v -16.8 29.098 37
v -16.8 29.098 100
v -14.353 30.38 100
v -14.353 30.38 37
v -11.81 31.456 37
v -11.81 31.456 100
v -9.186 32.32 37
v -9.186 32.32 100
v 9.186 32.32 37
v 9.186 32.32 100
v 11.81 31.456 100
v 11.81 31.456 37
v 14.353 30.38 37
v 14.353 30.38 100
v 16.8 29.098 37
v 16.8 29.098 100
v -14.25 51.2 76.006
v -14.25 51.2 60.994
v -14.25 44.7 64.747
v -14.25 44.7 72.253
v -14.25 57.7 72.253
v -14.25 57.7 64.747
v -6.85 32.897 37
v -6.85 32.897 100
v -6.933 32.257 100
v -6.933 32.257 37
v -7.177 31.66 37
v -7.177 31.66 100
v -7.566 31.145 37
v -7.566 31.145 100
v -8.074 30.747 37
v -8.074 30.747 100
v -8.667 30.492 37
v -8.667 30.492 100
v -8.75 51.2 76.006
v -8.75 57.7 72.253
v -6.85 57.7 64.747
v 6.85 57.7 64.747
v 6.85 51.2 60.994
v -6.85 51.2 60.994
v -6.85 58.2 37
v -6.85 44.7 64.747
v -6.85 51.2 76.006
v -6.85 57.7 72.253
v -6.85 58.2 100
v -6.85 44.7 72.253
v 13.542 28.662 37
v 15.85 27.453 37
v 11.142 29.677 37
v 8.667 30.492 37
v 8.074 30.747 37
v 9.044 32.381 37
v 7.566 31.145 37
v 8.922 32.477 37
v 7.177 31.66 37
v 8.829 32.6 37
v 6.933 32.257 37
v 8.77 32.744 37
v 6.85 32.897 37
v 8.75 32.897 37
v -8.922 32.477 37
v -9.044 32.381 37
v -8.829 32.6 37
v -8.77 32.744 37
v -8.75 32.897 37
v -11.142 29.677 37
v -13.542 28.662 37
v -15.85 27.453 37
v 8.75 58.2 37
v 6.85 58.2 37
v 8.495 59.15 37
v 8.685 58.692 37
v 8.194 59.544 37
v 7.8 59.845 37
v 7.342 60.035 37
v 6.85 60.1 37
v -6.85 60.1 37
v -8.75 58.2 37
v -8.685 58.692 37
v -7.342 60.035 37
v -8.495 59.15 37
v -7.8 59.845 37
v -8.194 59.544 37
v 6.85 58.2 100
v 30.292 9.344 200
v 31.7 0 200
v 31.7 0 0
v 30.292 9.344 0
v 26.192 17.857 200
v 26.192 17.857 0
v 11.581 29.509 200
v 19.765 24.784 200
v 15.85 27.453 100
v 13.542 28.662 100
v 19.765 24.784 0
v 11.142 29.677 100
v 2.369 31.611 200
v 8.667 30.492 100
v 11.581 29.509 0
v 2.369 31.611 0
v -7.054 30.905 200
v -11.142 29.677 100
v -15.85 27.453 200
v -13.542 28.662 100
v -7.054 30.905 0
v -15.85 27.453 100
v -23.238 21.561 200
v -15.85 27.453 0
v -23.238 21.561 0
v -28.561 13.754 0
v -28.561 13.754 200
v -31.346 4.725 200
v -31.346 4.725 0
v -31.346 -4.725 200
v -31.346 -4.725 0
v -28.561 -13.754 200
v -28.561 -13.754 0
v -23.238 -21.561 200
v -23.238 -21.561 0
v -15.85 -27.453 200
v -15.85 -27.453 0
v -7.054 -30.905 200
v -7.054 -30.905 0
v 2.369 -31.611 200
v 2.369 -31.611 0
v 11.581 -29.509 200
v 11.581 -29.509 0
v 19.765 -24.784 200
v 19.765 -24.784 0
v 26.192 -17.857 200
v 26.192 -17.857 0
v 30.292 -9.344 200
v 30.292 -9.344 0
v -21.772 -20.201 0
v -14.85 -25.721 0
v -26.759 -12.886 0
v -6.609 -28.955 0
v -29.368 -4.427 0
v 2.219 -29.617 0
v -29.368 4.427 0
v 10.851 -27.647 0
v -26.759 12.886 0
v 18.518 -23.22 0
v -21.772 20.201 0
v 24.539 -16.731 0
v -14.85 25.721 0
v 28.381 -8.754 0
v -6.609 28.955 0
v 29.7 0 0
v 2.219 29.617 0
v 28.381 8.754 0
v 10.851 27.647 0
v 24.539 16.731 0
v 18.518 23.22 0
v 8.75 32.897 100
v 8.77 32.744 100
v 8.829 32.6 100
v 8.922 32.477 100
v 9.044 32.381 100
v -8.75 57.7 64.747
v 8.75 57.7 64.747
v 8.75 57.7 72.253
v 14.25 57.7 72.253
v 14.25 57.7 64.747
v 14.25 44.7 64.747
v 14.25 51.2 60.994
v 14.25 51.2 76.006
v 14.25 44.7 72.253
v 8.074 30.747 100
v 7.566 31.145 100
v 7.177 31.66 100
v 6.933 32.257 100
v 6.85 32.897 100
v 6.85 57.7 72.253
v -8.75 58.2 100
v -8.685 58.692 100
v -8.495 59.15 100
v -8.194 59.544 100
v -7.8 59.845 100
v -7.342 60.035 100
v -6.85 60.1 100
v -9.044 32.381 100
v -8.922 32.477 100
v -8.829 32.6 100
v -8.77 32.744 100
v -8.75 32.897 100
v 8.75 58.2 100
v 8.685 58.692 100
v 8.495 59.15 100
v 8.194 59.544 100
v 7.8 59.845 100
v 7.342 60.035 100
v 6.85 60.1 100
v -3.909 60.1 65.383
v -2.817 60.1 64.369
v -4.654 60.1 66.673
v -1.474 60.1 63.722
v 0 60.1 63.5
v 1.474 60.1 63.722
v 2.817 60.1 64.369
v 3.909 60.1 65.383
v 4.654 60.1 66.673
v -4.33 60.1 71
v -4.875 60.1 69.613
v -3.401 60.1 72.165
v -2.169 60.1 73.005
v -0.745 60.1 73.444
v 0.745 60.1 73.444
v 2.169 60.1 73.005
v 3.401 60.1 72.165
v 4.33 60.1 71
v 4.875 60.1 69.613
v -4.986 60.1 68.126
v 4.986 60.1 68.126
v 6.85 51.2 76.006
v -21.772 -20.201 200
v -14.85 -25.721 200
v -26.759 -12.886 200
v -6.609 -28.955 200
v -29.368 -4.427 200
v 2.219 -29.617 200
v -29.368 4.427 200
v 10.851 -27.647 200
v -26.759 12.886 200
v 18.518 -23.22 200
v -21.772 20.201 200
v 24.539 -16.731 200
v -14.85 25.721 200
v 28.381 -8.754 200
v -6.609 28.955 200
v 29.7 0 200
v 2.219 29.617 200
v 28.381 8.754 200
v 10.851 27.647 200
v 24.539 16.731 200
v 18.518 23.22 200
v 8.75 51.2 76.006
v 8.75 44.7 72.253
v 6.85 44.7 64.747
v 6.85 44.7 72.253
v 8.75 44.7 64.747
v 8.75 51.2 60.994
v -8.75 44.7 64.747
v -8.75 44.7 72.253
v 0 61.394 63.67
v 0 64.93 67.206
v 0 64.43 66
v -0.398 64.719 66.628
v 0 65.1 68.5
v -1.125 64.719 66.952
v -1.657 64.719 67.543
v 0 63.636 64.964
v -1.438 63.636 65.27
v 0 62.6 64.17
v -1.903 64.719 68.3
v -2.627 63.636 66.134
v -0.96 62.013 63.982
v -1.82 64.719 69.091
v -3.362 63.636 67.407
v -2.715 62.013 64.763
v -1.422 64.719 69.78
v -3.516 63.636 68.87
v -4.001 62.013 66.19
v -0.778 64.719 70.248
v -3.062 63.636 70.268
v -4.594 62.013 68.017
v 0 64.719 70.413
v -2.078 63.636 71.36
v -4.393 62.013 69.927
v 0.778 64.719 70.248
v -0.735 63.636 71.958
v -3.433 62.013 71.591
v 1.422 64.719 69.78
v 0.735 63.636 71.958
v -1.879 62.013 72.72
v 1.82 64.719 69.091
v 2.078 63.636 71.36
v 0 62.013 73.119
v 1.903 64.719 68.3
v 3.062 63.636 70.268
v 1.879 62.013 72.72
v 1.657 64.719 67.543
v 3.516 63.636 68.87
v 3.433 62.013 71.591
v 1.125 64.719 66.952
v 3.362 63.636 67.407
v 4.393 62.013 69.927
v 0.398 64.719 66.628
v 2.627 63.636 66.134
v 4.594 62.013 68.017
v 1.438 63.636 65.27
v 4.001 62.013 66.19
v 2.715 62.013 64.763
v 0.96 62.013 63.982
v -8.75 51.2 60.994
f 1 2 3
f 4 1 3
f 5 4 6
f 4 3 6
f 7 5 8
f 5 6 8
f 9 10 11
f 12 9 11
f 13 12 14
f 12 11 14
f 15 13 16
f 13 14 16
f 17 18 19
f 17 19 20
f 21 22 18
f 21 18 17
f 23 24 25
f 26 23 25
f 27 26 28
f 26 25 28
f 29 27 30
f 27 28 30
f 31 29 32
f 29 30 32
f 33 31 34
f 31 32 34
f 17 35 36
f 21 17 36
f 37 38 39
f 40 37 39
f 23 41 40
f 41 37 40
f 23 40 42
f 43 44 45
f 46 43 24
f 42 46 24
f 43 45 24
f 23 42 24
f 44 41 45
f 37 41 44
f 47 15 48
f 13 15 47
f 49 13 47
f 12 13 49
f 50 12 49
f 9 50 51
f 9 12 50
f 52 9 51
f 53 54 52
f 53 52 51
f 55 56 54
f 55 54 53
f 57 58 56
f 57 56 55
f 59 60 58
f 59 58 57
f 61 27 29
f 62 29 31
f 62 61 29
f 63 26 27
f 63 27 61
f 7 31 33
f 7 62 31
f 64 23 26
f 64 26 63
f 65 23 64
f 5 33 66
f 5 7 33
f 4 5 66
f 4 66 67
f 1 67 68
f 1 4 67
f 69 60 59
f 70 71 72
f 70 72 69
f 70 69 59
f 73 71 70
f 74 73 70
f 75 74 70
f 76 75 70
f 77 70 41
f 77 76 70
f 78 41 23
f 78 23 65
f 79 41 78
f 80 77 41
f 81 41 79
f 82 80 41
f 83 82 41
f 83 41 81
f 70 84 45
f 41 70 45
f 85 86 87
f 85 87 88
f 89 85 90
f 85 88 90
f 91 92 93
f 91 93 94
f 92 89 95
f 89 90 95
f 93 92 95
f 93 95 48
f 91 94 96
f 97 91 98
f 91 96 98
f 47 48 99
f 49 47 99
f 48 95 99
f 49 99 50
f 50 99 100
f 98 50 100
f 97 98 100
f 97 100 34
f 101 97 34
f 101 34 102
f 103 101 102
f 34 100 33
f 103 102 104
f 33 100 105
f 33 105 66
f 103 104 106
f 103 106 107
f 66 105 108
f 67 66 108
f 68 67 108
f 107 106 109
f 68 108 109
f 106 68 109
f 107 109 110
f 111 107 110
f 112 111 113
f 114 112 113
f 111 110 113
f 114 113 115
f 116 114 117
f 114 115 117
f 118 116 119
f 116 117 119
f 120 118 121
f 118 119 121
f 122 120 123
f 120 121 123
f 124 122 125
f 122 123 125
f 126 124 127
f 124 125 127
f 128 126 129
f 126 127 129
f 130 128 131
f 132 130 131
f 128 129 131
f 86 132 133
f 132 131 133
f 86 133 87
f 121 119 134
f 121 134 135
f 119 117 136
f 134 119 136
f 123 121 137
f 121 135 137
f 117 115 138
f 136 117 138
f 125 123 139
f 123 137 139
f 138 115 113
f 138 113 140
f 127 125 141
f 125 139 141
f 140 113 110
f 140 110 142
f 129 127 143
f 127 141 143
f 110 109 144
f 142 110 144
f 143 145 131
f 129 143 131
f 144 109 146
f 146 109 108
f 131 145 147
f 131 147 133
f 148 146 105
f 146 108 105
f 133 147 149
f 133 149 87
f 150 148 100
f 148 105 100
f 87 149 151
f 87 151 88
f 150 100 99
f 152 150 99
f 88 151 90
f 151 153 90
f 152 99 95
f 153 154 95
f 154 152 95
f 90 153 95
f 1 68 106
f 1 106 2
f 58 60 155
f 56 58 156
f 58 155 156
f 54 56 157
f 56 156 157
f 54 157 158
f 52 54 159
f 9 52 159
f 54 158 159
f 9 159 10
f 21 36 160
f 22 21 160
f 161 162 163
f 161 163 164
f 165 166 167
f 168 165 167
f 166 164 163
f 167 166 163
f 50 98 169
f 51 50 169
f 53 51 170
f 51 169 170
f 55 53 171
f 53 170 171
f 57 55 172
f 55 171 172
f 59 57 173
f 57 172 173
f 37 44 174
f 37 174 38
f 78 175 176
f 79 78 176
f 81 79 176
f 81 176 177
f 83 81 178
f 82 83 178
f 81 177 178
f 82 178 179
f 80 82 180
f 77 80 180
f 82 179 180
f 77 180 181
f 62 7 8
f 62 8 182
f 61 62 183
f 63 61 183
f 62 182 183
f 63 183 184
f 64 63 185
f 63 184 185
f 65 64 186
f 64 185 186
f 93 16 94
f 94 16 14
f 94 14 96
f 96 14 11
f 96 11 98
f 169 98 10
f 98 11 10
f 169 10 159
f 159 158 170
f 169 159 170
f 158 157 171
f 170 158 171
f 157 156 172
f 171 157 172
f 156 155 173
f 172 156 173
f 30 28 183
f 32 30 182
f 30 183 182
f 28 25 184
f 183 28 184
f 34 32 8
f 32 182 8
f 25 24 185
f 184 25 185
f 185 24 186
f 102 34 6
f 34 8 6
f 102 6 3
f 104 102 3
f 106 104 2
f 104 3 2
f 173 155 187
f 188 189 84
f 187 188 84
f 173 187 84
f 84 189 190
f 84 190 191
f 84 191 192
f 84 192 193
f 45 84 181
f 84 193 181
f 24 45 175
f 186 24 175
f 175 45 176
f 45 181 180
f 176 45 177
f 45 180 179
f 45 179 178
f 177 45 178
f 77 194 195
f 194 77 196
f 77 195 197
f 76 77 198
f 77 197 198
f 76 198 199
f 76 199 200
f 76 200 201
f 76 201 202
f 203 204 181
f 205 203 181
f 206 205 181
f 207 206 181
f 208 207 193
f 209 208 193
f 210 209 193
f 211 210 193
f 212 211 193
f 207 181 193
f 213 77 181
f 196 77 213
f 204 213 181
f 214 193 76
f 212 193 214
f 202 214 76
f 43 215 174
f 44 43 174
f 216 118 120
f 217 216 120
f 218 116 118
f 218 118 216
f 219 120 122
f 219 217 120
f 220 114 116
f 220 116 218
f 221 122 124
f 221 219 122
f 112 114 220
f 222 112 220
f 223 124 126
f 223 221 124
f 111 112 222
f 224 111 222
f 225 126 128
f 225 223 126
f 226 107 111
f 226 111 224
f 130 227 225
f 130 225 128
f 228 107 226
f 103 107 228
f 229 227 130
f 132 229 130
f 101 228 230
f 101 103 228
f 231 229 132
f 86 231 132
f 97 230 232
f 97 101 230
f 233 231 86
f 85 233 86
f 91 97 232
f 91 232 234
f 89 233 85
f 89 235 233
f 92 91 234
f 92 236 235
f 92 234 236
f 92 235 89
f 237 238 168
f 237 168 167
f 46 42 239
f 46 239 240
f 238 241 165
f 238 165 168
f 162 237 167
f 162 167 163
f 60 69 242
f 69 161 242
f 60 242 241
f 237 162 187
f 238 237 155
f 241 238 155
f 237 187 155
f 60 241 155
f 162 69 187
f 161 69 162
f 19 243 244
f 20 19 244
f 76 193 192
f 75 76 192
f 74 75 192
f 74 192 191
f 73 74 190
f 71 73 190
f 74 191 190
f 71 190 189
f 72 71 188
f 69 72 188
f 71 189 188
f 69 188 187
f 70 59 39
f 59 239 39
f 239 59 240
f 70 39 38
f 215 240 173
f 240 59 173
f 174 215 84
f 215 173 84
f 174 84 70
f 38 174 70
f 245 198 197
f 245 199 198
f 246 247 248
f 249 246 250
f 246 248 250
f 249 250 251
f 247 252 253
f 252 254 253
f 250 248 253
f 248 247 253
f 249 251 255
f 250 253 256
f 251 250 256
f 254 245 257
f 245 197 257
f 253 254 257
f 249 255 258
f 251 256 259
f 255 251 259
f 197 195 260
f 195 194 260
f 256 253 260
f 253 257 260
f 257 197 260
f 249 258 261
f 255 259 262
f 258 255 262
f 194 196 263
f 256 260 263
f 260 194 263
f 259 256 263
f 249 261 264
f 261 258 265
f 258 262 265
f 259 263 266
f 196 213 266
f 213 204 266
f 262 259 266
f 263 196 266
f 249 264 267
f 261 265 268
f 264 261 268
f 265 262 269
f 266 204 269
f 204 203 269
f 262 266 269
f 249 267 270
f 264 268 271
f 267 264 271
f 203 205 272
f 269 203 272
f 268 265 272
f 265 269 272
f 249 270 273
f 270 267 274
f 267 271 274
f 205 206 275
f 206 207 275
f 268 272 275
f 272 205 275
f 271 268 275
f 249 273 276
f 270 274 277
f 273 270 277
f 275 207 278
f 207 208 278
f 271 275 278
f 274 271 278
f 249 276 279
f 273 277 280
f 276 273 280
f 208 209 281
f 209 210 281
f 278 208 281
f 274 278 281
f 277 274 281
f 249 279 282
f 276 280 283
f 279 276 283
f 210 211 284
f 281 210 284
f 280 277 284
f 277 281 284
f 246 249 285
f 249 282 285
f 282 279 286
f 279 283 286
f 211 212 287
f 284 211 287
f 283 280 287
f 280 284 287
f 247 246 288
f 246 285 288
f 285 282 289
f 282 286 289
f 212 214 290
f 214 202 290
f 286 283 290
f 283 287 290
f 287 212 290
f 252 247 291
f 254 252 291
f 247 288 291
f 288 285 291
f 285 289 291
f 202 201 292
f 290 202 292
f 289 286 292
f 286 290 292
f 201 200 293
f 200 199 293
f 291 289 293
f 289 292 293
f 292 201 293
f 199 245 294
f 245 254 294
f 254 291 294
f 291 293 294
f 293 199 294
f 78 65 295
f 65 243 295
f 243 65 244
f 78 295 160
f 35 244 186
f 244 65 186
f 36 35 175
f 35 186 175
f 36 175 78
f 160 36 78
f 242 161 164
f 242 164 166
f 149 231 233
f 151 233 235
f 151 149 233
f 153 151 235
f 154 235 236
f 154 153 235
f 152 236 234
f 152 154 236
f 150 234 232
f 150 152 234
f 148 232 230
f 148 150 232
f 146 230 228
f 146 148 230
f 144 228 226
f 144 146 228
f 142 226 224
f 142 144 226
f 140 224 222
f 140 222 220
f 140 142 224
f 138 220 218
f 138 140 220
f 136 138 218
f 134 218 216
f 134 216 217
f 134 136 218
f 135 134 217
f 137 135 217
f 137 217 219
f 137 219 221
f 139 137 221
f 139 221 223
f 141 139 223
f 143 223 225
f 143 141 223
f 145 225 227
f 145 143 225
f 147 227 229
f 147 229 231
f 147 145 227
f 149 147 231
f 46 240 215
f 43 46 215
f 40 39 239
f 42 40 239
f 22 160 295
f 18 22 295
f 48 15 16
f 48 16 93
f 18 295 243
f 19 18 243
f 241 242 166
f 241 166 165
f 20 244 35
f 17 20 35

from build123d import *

# Parameters (mm, degrees)
SKETCH1_R                = 31.7
SKETCH1_R_2              = 29.7
BOSS_EXTRUDE1_DEPTH      = 200
BOSS_EXTRUDE2_DEPTH      = 63
BOSS_EXTRUDE3_DEPTH      = 5.5
BOSS_EXTRUDE3_DEPTH_BACK = 23


with BuildPart() as part:
    # Sketch1 → Boss-Extrude1 (new body)
    with BuildSketch(Plane.XY):
        Circle(SKETCH1_R)
        Circle(SKETCH1_R_2, mode=Mode.SUBTRACT)
    extrude(amount=BOSS_EXTRUDE1_DEPTH)

    # Sketch4 → Boss-Extrude2 (add)
    with BuildSketch(Plane(origin=(0, 0, 100), x_dir=(-1, 0, 0), z_dir=(0, 0, -1))):
        with BuildLine():
            Line((-6.85, 32.897074338), (-6.85, 58.2))
            Line((-6.85, 58.2), (6.85, 58.2))
            Line((6.85, 58.2), (6.85, 32.897074338))
            ThreePointArc((6.85, 32.897074338), (7.355169327, 31.390206532), (8.666520468, 30.492317442))
            ThreePointArc((8.666520468, 30.492317442), (12.352096929, 29.194446415), (15.85, 27.4530053))
            Line((15.85, 27.4530053), (16.8, 29.098453567))
            ThreePointArc((16.8, 29.098453567), (13.092443432, 30.944271279), (9.185964912, 32.319932683))
            ThreePointArc((9.185964912, 32.319932683), (8.871240638, 32.535426065), (8.75, 32.897074338))
            Line((8.75, 32.897074338), (8.75, 58.2))
            ThreePointArc((8.75, 58.2), (8.193502884, 59.543502884), (6.85, 60.1))
            Line((6.85, 60.1), (-6.85, 60.1))
            ThreePointArc((-6.85, 60.1), (-8.193502884, 59.543502884), (-8.75, 58.2))
            Line((-8.75, 58.2), (-8.75, 32.897074338))
            ThreePointArc((-8.75, 32.897074338), (-8.871240638, 32.535426065), (-9.185964912, 32.319932683))
            ThreePointArc((-9.185964912, 32.319932683), (-13.092443432, 30.944271279), (-16.8, 29.098453567))
            Line((-16.8, 29.098453567), (-15.85, 27.4530053))
            ThreePointArc((-15.85, 27.4530053), (-12.352096929, 29.194446415), (-8.666520468, 30.492317442))
            ThreePointArc((-8.666520468, 30.492317442), (-7.355169327, 31.390206532), (-6.85, 32.897074338))
        make_face()
    extrude(amount=BOSS_EXTRUDE2_DEPTH)

    # Sketch5 one side → Revolve1 (revolve)
    with BuildSketch(Plane.ZY):
        with BuildLine():
            Line((68.5, 60.1), (68.5, 65.1))
            ThreePointArc((68.5, 65.1), (64.964466094, 63.635533906), (63.5, 60.1))
            Line((63.5, 60.1), (68.5, 60.1))
        make_face()
    revolve(axis=Axis((0, 60.1, 68.5), (0, 1, 0)))

    # Sketch6 → Boss-Extrude3 (add, two sides)
    with BuildSketch(Plane.ZY.offset(8.75)) as boss_extrude3_sk:
        Polygon((72.25277675, 44.7), (76.005553499, 51.2), (72.25277675, 57.7), (64.74722325, 57.7), (60.994446501, 51.2), (64.74722325, 44.7), align=None)
    extrude(amount=BOSS_EXTRUDE3_DEPTH)
    extrude(boss_extrude3_sk.sketch, amount=-BOSS_EXTRUDE3_DEPTH_BACK)


solid = part.part
